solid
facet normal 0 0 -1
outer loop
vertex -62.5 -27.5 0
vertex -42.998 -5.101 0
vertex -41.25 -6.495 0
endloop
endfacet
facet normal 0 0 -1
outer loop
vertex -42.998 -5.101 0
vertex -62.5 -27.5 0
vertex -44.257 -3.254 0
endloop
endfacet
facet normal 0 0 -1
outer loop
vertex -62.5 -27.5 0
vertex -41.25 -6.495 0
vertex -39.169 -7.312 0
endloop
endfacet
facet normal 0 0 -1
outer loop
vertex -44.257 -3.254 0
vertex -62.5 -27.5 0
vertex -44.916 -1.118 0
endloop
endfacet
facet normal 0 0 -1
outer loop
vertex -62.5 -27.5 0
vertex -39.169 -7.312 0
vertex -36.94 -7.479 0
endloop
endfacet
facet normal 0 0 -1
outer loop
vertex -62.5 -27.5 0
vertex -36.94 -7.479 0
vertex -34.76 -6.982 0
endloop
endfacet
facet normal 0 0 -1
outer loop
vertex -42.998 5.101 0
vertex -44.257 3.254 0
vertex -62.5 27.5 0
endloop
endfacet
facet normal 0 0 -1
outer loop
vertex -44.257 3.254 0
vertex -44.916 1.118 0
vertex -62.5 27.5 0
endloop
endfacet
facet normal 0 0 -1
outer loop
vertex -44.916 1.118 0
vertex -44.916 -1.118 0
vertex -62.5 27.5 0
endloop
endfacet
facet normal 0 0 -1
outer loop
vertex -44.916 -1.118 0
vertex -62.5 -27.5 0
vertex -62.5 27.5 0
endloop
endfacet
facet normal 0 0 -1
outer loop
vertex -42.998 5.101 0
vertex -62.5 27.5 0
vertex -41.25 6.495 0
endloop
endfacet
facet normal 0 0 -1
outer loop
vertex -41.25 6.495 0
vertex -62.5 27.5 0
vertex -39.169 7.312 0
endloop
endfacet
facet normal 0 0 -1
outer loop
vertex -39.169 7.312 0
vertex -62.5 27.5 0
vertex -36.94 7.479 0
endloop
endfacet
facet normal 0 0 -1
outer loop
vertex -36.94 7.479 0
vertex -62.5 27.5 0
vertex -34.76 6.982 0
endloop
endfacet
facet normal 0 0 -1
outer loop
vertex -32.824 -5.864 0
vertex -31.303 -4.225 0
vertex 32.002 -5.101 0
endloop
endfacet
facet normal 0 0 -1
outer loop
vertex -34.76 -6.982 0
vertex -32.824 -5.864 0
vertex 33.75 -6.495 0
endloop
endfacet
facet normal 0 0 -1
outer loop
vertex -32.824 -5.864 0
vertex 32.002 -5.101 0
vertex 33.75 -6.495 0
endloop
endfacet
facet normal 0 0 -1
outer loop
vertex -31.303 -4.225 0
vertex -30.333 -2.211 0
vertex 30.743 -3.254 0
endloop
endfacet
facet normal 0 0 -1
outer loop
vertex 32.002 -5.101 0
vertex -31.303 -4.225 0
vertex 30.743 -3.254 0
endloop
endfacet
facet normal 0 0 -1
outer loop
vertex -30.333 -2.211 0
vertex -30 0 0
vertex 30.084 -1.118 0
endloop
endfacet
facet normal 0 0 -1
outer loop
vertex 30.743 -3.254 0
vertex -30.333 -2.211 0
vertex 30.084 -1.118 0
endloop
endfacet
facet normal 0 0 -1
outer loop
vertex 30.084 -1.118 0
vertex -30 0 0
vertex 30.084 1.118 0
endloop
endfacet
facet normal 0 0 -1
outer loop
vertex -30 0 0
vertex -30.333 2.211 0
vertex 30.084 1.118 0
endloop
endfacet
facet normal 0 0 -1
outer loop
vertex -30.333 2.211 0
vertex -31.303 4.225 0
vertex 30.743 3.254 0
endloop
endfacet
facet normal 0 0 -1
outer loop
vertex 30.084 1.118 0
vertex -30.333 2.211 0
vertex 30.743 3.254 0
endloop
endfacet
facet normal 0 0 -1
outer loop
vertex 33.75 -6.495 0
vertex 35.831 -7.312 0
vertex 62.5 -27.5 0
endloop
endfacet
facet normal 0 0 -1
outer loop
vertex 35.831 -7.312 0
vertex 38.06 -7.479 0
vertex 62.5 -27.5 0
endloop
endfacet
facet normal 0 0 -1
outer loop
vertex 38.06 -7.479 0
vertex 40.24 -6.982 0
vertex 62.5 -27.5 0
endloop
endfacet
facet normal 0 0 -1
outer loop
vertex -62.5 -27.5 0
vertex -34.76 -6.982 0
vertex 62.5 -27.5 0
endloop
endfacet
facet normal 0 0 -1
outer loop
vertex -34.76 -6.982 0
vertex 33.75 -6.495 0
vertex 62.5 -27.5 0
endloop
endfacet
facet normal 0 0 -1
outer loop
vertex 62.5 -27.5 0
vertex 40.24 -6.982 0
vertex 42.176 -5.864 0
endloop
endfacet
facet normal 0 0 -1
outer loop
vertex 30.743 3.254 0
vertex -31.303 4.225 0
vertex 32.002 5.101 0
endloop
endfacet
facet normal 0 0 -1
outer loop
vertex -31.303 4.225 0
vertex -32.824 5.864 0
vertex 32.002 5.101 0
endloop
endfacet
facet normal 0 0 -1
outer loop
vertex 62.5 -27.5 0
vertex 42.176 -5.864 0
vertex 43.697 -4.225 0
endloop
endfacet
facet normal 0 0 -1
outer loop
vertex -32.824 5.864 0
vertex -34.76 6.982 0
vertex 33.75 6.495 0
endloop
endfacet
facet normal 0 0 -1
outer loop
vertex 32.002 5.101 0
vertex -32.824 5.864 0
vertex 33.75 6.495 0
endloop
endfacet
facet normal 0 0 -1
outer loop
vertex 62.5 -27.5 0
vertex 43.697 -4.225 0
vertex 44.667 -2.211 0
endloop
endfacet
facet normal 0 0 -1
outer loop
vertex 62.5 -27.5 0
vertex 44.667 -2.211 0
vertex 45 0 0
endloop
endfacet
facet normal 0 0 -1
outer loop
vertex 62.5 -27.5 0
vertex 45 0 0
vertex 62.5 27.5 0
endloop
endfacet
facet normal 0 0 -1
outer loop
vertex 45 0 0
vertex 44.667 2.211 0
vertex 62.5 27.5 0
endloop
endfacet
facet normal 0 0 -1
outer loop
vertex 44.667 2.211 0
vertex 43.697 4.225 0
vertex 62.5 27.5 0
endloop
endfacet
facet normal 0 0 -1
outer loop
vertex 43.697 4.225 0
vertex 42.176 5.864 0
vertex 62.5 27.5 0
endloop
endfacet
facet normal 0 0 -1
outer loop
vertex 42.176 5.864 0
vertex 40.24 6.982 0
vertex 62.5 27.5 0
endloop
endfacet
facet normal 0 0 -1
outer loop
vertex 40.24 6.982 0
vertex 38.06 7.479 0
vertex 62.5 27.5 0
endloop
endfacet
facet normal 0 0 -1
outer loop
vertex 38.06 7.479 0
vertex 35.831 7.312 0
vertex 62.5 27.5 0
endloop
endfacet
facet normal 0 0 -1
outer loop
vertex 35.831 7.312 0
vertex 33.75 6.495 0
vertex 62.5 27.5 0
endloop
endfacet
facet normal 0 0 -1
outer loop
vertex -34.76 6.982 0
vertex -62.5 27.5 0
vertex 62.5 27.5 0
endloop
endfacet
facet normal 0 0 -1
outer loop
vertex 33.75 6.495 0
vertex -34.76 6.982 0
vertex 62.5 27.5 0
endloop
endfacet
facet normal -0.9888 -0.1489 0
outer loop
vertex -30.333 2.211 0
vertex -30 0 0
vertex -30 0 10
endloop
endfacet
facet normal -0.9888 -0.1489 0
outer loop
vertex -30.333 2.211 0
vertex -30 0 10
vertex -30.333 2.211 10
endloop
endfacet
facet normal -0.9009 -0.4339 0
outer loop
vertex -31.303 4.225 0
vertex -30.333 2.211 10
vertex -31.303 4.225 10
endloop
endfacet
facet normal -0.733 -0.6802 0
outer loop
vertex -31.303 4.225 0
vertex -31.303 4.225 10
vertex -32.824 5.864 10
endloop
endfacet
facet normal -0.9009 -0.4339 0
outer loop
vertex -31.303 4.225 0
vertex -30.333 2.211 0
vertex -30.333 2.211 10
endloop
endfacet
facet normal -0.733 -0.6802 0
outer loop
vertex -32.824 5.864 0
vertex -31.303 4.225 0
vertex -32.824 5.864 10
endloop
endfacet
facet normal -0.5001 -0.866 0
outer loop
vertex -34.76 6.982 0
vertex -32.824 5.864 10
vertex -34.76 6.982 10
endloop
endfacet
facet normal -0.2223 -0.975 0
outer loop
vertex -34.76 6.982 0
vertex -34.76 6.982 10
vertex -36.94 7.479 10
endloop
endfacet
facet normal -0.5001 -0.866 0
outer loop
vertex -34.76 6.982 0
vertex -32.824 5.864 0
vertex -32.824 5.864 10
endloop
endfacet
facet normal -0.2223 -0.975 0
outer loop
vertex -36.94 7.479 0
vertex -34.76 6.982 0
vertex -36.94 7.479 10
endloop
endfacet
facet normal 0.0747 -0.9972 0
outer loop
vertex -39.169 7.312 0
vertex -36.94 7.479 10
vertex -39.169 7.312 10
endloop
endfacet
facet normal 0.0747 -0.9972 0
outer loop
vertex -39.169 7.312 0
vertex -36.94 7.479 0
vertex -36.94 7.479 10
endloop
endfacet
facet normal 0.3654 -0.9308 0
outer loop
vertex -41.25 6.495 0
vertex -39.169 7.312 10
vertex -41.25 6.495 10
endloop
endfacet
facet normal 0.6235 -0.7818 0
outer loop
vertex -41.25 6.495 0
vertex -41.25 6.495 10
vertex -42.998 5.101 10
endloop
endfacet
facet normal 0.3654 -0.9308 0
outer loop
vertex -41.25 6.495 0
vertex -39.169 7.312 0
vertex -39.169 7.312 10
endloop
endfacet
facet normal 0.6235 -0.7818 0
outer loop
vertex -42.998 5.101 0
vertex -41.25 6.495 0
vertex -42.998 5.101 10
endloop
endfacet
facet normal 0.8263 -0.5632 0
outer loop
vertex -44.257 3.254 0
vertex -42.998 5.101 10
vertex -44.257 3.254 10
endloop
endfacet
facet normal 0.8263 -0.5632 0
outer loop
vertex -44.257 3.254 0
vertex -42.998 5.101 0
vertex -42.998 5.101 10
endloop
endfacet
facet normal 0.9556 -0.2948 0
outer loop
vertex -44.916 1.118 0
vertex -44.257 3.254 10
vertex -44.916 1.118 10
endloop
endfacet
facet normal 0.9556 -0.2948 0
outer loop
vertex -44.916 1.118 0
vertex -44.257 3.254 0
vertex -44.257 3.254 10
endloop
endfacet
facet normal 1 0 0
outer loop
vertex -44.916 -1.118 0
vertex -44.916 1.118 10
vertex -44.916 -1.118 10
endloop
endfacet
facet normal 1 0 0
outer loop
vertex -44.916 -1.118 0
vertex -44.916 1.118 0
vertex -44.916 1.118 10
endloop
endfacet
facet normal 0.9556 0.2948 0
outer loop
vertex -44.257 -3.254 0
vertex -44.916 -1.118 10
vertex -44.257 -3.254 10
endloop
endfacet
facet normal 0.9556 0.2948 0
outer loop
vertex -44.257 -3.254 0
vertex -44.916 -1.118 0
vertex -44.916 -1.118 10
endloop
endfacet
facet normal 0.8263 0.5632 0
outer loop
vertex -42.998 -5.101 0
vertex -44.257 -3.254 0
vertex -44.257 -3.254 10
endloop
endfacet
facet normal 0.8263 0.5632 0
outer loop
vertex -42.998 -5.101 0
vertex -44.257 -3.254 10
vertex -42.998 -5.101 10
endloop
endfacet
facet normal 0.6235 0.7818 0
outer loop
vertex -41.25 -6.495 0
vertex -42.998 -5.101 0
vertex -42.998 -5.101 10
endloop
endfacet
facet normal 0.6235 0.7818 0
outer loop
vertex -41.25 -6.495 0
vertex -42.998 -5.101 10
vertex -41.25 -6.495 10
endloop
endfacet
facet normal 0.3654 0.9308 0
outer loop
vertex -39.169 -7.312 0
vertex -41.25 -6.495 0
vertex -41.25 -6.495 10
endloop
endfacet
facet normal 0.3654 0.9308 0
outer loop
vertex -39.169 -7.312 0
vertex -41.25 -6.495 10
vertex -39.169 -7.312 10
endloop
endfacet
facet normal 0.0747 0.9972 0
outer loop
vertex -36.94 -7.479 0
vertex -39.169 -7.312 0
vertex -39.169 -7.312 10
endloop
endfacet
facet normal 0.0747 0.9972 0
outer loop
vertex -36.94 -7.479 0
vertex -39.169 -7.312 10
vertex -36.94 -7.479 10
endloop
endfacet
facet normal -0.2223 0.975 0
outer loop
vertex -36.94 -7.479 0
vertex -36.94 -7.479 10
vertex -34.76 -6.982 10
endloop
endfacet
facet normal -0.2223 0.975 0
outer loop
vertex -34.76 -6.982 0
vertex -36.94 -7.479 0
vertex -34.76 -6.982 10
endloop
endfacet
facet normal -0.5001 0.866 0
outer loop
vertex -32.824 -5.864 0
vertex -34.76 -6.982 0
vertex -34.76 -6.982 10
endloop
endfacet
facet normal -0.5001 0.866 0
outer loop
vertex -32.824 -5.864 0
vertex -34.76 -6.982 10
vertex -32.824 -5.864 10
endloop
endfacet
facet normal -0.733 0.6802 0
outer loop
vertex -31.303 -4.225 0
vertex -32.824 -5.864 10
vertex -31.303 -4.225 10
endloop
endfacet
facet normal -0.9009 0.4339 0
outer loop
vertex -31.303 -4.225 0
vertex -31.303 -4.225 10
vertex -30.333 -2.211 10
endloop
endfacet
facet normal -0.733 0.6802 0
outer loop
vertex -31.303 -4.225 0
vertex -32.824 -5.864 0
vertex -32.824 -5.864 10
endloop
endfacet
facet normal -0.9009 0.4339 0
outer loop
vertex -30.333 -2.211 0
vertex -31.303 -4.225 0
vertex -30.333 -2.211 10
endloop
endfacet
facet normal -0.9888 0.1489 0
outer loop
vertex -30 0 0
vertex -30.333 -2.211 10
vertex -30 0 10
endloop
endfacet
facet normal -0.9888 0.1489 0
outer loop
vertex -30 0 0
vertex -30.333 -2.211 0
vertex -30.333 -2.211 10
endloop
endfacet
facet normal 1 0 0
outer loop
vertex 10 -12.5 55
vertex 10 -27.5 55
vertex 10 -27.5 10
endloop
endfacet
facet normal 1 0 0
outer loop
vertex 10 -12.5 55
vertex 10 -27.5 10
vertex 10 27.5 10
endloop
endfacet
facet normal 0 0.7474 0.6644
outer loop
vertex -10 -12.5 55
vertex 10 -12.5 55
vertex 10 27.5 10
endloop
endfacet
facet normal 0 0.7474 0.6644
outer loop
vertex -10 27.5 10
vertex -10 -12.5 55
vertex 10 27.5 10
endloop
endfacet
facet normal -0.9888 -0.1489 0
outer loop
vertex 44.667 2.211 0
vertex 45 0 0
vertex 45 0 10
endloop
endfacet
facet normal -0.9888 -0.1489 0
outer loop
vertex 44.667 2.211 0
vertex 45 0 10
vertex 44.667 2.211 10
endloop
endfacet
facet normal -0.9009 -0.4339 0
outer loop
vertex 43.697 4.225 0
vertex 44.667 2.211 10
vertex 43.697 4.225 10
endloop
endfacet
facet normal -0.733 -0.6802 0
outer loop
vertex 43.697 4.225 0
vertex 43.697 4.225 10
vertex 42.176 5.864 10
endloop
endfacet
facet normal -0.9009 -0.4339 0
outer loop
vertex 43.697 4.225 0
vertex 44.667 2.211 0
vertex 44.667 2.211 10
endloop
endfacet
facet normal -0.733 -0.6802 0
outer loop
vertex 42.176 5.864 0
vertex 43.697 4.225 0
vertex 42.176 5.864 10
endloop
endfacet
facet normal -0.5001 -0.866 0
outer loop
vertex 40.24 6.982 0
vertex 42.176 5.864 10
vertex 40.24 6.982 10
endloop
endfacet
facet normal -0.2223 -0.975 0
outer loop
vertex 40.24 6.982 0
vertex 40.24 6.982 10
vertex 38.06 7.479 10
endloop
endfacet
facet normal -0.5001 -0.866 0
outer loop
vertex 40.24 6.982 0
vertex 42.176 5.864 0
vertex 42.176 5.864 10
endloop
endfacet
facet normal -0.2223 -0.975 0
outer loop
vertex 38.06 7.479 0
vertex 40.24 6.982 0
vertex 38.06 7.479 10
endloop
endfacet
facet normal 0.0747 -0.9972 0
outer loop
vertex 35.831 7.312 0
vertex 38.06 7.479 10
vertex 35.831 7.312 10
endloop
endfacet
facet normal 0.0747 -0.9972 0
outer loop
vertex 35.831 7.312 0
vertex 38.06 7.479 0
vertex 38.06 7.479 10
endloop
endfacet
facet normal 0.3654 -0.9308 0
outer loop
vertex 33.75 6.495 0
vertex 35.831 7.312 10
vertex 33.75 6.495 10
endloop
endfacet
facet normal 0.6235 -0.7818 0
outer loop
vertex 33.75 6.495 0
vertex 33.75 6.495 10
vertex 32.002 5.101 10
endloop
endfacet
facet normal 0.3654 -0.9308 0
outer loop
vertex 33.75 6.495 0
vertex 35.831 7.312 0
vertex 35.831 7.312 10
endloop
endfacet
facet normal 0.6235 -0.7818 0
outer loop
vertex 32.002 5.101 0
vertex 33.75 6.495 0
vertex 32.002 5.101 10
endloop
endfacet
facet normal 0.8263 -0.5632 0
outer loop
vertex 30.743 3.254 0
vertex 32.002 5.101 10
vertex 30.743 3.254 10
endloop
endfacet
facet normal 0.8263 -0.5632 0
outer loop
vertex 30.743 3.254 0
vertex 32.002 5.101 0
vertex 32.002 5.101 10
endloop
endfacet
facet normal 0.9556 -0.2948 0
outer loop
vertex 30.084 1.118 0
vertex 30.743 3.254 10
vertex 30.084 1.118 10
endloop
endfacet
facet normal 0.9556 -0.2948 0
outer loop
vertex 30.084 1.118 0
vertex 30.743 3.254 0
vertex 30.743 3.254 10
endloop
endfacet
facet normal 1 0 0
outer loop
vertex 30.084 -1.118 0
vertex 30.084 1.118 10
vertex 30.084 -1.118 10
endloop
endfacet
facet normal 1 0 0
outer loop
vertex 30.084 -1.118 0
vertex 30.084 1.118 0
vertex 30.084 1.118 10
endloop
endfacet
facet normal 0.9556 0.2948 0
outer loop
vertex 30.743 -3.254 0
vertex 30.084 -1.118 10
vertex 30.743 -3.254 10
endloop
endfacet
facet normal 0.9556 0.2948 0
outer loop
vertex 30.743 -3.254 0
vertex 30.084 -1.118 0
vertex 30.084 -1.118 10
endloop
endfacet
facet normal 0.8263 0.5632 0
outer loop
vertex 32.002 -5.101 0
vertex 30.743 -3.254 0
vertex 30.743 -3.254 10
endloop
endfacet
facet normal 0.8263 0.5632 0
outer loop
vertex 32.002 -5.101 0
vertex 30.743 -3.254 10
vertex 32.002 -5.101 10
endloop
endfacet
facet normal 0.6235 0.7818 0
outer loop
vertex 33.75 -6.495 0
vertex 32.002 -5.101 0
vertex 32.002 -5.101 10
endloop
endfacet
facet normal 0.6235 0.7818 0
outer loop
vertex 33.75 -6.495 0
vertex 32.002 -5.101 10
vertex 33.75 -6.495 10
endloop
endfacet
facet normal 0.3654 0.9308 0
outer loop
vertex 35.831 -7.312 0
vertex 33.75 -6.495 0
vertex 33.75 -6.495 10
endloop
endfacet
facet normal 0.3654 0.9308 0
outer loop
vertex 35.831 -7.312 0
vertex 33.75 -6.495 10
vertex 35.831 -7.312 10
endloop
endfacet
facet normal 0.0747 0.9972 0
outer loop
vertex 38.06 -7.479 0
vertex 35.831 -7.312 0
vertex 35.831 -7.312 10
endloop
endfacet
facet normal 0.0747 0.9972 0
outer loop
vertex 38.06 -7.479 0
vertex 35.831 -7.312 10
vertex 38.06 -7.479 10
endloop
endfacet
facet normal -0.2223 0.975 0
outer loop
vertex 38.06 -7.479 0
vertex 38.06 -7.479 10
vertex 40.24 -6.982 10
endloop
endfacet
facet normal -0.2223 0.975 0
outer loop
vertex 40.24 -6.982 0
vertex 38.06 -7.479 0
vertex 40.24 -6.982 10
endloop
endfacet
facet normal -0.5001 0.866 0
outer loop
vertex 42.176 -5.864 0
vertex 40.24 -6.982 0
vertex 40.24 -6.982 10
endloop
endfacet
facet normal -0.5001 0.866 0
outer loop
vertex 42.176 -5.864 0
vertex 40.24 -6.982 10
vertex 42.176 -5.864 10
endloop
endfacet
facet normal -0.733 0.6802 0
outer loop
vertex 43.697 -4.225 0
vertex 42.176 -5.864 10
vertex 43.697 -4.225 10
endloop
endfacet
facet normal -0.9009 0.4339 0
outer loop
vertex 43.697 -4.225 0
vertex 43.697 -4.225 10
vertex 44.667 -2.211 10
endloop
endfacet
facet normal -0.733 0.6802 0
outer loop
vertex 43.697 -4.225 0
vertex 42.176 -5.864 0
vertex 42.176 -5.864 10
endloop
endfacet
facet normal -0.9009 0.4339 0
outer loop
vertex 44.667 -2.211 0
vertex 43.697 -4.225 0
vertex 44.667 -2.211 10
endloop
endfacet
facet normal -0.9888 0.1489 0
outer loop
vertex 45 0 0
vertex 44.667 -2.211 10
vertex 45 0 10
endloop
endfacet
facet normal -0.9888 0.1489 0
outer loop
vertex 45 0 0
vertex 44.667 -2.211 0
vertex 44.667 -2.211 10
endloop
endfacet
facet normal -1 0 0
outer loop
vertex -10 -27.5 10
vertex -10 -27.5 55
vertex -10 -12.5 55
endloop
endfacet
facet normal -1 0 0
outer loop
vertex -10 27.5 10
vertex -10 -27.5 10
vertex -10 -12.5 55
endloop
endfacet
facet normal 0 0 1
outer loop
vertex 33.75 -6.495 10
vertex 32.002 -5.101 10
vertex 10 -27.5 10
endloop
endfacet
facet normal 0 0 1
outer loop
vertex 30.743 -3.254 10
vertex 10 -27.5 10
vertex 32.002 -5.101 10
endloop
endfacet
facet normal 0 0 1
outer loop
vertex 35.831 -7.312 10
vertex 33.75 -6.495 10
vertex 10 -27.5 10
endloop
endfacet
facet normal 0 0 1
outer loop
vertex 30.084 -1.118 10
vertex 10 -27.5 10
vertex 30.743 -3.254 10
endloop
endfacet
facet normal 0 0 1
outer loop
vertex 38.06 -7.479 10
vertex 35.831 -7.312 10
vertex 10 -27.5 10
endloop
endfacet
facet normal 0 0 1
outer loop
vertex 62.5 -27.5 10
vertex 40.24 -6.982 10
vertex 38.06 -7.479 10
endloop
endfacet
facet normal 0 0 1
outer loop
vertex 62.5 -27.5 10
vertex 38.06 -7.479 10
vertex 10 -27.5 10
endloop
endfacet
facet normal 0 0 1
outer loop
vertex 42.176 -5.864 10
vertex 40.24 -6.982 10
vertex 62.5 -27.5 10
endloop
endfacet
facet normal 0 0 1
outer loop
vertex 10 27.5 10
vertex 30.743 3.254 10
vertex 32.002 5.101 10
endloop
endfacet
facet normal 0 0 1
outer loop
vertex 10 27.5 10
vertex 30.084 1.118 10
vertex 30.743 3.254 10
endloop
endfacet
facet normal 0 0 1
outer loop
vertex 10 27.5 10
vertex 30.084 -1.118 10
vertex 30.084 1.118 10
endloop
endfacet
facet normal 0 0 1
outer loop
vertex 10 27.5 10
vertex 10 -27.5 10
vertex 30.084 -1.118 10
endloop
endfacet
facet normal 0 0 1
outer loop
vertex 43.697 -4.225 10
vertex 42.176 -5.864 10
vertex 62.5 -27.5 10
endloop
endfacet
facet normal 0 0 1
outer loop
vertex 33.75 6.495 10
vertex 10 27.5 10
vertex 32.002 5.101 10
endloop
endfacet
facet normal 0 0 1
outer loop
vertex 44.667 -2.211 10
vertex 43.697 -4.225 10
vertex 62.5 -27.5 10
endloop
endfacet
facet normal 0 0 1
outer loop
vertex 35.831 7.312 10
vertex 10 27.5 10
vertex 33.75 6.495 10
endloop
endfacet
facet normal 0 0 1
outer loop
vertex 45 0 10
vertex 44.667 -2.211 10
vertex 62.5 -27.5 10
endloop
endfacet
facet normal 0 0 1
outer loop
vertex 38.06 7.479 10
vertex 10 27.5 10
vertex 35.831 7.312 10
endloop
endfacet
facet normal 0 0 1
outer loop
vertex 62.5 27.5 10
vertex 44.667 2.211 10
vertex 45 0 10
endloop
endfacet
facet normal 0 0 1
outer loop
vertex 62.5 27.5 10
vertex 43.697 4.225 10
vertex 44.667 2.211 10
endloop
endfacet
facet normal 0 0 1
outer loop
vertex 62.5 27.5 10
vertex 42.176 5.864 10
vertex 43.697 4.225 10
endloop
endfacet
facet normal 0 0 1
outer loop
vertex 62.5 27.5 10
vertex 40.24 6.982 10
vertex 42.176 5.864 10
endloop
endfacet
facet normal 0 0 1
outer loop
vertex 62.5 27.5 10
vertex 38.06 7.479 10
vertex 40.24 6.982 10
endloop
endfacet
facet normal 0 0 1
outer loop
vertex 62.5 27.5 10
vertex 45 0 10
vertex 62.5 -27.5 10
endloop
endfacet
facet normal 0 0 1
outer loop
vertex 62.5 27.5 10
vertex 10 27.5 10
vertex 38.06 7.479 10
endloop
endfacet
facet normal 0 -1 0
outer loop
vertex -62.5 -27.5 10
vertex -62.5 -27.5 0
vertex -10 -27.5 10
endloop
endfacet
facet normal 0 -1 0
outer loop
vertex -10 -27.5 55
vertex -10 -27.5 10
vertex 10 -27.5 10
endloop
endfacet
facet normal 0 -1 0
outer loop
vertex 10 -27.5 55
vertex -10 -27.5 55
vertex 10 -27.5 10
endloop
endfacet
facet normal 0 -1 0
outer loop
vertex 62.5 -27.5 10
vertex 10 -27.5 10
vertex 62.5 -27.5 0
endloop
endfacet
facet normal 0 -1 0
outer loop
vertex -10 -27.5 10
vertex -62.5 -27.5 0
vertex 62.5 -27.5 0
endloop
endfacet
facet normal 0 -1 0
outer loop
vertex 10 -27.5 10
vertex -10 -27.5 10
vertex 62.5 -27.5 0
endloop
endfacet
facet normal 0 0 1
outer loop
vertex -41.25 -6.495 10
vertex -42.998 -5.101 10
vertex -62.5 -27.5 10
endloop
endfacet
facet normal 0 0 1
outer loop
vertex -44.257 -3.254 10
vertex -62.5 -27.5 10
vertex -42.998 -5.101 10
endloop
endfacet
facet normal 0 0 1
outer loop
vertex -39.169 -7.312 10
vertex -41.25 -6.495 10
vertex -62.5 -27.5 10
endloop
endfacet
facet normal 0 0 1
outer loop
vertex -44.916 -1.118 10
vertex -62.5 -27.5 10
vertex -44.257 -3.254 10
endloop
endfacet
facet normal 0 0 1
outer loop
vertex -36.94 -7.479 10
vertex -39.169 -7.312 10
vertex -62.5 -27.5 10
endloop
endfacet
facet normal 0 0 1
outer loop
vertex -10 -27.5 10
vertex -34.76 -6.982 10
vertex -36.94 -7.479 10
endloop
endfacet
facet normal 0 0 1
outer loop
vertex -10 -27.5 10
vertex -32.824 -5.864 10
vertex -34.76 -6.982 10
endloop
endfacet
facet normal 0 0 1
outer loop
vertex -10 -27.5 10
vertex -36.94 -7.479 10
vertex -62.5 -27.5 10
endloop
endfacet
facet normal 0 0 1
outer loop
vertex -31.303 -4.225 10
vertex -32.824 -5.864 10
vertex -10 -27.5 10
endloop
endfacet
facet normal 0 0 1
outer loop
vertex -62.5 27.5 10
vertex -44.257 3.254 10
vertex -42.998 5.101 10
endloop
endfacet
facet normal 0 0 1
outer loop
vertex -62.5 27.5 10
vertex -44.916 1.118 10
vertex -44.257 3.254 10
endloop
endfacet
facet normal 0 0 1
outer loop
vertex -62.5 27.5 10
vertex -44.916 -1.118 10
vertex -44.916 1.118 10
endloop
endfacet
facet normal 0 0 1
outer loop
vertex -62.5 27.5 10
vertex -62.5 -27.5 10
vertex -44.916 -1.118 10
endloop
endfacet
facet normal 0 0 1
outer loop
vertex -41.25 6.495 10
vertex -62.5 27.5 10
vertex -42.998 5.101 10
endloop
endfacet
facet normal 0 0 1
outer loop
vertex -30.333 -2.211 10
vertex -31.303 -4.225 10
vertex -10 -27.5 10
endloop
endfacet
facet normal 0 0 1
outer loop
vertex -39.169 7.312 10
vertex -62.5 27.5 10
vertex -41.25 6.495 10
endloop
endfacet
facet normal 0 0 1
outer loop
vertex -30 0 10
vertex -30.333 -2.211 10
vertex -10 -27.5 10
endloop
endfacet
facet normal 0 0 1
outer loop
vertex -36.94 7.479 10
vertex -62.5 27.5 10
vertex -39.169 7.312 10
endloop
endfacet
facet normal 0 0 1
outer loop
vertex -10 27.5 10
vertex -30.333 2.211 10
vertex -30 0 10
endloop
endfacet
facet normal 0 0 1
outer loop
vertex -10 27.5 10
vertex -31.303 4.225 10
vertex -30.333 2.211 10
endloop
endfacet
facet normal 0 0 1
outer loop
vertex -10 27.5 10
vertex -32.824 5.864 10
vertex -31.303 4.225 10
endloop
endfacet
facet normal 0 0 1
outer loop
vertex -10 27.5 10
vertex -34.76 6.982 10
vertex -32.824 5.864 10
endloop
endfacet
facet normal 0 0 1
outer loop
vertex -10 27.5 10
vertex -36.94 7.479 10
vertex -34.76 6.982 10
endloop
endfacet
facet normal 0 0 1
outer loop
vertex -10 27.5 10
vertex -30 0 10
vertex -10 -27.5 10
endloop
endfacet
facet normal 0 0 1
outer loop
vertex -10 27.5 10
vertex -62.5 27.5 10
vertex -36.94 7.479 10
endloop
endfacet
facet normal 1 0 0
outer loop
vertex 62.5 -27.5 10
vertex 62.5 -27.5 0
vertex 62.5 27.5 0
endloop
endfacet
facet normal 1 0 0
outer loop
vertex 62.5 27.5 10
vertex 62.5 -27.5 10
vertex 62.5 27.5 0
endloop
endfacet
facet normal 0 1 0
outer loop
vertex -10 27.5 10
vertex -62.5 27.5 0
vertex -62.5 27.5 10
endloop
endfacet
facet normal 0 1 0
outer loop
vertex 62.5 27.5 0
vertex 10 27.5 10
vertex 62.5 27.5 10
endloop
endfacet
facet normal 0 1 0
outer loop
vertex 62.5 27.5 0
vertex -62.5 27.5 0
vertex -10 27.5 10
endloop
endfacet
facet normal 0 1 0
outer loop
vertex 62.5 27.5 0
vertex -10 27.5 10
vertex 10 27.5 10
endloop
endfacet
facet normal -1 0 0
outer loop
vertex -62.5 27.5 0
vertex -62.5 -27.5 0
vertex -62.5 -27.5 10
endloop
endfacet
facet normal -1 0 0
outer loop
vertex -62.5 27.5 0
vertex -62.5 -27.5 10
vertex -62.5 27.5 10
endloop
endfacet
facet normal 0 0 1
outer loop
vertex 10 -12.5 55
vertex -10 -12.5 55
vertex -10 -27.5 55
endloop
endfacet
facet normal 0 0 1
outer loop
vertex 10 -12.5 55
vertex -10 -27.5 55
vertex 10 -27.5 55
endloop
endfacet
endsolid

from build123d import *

# Parameters (mm, degrees)
SZKIC1_W                    = 125
SZKIC1_H                    = 55
SZKIC1_R                    = 7.5
DODANIE_WYCI_GNI_CIE1_DEPTH = 10
SZKIC2_W                    = 20
SZKIC2_H                    = 55
DODANIE_WYCI_GNI_CIE2_DEPTH = 45
WYTNIJ_WYCI_GNI_CIE1_DEPTH  = 45


with BuildPart() as part:
    # Szkic1 → Dodanie-wyciągnięcie1 (new body)
    with BuildSketch(Plane.XY):
        Rectangle(SZKIC1_W, SZKIC1_H)
        with Locations((-37.5, 0)):
            Circle(SZKIC1_R, mode=Mode.SUBTRACT)
        with Locations((37.5, 0)):
            Circle(SZKIC1_R, mode=Mode.SUBTRACT)
    extrude(amount=DODANIE_WYCI_GNI_CIE1_DEPTH)

    # Szkic2 → Dodanie-wyciągnięcie2 (add)
    with BuildSketch(Plane.XY.offset(10)):
        Rectangle(SZKIC2_W, SZKIC2_H)
    extrude(amount=DODANIE_WYCI_GNI_CIE2_DEPTH)

    # Szkic3 → Wytnij-wyciągnięcie1 (cut)
    with BuildSketch(Plane(origin=(10, 0, 0), x_dir=(0, 0, -1), z_dir=(1, 0, 0))):
        Polygon((-55, -12.5), (-10, 27.5), (-55, 27.5), align=None)
    extrude(amount=-WYTNIJ_WYCI_GNI_CIE1_DEPTH, mode=Mode.SUBTRACT)


solid = part.part
